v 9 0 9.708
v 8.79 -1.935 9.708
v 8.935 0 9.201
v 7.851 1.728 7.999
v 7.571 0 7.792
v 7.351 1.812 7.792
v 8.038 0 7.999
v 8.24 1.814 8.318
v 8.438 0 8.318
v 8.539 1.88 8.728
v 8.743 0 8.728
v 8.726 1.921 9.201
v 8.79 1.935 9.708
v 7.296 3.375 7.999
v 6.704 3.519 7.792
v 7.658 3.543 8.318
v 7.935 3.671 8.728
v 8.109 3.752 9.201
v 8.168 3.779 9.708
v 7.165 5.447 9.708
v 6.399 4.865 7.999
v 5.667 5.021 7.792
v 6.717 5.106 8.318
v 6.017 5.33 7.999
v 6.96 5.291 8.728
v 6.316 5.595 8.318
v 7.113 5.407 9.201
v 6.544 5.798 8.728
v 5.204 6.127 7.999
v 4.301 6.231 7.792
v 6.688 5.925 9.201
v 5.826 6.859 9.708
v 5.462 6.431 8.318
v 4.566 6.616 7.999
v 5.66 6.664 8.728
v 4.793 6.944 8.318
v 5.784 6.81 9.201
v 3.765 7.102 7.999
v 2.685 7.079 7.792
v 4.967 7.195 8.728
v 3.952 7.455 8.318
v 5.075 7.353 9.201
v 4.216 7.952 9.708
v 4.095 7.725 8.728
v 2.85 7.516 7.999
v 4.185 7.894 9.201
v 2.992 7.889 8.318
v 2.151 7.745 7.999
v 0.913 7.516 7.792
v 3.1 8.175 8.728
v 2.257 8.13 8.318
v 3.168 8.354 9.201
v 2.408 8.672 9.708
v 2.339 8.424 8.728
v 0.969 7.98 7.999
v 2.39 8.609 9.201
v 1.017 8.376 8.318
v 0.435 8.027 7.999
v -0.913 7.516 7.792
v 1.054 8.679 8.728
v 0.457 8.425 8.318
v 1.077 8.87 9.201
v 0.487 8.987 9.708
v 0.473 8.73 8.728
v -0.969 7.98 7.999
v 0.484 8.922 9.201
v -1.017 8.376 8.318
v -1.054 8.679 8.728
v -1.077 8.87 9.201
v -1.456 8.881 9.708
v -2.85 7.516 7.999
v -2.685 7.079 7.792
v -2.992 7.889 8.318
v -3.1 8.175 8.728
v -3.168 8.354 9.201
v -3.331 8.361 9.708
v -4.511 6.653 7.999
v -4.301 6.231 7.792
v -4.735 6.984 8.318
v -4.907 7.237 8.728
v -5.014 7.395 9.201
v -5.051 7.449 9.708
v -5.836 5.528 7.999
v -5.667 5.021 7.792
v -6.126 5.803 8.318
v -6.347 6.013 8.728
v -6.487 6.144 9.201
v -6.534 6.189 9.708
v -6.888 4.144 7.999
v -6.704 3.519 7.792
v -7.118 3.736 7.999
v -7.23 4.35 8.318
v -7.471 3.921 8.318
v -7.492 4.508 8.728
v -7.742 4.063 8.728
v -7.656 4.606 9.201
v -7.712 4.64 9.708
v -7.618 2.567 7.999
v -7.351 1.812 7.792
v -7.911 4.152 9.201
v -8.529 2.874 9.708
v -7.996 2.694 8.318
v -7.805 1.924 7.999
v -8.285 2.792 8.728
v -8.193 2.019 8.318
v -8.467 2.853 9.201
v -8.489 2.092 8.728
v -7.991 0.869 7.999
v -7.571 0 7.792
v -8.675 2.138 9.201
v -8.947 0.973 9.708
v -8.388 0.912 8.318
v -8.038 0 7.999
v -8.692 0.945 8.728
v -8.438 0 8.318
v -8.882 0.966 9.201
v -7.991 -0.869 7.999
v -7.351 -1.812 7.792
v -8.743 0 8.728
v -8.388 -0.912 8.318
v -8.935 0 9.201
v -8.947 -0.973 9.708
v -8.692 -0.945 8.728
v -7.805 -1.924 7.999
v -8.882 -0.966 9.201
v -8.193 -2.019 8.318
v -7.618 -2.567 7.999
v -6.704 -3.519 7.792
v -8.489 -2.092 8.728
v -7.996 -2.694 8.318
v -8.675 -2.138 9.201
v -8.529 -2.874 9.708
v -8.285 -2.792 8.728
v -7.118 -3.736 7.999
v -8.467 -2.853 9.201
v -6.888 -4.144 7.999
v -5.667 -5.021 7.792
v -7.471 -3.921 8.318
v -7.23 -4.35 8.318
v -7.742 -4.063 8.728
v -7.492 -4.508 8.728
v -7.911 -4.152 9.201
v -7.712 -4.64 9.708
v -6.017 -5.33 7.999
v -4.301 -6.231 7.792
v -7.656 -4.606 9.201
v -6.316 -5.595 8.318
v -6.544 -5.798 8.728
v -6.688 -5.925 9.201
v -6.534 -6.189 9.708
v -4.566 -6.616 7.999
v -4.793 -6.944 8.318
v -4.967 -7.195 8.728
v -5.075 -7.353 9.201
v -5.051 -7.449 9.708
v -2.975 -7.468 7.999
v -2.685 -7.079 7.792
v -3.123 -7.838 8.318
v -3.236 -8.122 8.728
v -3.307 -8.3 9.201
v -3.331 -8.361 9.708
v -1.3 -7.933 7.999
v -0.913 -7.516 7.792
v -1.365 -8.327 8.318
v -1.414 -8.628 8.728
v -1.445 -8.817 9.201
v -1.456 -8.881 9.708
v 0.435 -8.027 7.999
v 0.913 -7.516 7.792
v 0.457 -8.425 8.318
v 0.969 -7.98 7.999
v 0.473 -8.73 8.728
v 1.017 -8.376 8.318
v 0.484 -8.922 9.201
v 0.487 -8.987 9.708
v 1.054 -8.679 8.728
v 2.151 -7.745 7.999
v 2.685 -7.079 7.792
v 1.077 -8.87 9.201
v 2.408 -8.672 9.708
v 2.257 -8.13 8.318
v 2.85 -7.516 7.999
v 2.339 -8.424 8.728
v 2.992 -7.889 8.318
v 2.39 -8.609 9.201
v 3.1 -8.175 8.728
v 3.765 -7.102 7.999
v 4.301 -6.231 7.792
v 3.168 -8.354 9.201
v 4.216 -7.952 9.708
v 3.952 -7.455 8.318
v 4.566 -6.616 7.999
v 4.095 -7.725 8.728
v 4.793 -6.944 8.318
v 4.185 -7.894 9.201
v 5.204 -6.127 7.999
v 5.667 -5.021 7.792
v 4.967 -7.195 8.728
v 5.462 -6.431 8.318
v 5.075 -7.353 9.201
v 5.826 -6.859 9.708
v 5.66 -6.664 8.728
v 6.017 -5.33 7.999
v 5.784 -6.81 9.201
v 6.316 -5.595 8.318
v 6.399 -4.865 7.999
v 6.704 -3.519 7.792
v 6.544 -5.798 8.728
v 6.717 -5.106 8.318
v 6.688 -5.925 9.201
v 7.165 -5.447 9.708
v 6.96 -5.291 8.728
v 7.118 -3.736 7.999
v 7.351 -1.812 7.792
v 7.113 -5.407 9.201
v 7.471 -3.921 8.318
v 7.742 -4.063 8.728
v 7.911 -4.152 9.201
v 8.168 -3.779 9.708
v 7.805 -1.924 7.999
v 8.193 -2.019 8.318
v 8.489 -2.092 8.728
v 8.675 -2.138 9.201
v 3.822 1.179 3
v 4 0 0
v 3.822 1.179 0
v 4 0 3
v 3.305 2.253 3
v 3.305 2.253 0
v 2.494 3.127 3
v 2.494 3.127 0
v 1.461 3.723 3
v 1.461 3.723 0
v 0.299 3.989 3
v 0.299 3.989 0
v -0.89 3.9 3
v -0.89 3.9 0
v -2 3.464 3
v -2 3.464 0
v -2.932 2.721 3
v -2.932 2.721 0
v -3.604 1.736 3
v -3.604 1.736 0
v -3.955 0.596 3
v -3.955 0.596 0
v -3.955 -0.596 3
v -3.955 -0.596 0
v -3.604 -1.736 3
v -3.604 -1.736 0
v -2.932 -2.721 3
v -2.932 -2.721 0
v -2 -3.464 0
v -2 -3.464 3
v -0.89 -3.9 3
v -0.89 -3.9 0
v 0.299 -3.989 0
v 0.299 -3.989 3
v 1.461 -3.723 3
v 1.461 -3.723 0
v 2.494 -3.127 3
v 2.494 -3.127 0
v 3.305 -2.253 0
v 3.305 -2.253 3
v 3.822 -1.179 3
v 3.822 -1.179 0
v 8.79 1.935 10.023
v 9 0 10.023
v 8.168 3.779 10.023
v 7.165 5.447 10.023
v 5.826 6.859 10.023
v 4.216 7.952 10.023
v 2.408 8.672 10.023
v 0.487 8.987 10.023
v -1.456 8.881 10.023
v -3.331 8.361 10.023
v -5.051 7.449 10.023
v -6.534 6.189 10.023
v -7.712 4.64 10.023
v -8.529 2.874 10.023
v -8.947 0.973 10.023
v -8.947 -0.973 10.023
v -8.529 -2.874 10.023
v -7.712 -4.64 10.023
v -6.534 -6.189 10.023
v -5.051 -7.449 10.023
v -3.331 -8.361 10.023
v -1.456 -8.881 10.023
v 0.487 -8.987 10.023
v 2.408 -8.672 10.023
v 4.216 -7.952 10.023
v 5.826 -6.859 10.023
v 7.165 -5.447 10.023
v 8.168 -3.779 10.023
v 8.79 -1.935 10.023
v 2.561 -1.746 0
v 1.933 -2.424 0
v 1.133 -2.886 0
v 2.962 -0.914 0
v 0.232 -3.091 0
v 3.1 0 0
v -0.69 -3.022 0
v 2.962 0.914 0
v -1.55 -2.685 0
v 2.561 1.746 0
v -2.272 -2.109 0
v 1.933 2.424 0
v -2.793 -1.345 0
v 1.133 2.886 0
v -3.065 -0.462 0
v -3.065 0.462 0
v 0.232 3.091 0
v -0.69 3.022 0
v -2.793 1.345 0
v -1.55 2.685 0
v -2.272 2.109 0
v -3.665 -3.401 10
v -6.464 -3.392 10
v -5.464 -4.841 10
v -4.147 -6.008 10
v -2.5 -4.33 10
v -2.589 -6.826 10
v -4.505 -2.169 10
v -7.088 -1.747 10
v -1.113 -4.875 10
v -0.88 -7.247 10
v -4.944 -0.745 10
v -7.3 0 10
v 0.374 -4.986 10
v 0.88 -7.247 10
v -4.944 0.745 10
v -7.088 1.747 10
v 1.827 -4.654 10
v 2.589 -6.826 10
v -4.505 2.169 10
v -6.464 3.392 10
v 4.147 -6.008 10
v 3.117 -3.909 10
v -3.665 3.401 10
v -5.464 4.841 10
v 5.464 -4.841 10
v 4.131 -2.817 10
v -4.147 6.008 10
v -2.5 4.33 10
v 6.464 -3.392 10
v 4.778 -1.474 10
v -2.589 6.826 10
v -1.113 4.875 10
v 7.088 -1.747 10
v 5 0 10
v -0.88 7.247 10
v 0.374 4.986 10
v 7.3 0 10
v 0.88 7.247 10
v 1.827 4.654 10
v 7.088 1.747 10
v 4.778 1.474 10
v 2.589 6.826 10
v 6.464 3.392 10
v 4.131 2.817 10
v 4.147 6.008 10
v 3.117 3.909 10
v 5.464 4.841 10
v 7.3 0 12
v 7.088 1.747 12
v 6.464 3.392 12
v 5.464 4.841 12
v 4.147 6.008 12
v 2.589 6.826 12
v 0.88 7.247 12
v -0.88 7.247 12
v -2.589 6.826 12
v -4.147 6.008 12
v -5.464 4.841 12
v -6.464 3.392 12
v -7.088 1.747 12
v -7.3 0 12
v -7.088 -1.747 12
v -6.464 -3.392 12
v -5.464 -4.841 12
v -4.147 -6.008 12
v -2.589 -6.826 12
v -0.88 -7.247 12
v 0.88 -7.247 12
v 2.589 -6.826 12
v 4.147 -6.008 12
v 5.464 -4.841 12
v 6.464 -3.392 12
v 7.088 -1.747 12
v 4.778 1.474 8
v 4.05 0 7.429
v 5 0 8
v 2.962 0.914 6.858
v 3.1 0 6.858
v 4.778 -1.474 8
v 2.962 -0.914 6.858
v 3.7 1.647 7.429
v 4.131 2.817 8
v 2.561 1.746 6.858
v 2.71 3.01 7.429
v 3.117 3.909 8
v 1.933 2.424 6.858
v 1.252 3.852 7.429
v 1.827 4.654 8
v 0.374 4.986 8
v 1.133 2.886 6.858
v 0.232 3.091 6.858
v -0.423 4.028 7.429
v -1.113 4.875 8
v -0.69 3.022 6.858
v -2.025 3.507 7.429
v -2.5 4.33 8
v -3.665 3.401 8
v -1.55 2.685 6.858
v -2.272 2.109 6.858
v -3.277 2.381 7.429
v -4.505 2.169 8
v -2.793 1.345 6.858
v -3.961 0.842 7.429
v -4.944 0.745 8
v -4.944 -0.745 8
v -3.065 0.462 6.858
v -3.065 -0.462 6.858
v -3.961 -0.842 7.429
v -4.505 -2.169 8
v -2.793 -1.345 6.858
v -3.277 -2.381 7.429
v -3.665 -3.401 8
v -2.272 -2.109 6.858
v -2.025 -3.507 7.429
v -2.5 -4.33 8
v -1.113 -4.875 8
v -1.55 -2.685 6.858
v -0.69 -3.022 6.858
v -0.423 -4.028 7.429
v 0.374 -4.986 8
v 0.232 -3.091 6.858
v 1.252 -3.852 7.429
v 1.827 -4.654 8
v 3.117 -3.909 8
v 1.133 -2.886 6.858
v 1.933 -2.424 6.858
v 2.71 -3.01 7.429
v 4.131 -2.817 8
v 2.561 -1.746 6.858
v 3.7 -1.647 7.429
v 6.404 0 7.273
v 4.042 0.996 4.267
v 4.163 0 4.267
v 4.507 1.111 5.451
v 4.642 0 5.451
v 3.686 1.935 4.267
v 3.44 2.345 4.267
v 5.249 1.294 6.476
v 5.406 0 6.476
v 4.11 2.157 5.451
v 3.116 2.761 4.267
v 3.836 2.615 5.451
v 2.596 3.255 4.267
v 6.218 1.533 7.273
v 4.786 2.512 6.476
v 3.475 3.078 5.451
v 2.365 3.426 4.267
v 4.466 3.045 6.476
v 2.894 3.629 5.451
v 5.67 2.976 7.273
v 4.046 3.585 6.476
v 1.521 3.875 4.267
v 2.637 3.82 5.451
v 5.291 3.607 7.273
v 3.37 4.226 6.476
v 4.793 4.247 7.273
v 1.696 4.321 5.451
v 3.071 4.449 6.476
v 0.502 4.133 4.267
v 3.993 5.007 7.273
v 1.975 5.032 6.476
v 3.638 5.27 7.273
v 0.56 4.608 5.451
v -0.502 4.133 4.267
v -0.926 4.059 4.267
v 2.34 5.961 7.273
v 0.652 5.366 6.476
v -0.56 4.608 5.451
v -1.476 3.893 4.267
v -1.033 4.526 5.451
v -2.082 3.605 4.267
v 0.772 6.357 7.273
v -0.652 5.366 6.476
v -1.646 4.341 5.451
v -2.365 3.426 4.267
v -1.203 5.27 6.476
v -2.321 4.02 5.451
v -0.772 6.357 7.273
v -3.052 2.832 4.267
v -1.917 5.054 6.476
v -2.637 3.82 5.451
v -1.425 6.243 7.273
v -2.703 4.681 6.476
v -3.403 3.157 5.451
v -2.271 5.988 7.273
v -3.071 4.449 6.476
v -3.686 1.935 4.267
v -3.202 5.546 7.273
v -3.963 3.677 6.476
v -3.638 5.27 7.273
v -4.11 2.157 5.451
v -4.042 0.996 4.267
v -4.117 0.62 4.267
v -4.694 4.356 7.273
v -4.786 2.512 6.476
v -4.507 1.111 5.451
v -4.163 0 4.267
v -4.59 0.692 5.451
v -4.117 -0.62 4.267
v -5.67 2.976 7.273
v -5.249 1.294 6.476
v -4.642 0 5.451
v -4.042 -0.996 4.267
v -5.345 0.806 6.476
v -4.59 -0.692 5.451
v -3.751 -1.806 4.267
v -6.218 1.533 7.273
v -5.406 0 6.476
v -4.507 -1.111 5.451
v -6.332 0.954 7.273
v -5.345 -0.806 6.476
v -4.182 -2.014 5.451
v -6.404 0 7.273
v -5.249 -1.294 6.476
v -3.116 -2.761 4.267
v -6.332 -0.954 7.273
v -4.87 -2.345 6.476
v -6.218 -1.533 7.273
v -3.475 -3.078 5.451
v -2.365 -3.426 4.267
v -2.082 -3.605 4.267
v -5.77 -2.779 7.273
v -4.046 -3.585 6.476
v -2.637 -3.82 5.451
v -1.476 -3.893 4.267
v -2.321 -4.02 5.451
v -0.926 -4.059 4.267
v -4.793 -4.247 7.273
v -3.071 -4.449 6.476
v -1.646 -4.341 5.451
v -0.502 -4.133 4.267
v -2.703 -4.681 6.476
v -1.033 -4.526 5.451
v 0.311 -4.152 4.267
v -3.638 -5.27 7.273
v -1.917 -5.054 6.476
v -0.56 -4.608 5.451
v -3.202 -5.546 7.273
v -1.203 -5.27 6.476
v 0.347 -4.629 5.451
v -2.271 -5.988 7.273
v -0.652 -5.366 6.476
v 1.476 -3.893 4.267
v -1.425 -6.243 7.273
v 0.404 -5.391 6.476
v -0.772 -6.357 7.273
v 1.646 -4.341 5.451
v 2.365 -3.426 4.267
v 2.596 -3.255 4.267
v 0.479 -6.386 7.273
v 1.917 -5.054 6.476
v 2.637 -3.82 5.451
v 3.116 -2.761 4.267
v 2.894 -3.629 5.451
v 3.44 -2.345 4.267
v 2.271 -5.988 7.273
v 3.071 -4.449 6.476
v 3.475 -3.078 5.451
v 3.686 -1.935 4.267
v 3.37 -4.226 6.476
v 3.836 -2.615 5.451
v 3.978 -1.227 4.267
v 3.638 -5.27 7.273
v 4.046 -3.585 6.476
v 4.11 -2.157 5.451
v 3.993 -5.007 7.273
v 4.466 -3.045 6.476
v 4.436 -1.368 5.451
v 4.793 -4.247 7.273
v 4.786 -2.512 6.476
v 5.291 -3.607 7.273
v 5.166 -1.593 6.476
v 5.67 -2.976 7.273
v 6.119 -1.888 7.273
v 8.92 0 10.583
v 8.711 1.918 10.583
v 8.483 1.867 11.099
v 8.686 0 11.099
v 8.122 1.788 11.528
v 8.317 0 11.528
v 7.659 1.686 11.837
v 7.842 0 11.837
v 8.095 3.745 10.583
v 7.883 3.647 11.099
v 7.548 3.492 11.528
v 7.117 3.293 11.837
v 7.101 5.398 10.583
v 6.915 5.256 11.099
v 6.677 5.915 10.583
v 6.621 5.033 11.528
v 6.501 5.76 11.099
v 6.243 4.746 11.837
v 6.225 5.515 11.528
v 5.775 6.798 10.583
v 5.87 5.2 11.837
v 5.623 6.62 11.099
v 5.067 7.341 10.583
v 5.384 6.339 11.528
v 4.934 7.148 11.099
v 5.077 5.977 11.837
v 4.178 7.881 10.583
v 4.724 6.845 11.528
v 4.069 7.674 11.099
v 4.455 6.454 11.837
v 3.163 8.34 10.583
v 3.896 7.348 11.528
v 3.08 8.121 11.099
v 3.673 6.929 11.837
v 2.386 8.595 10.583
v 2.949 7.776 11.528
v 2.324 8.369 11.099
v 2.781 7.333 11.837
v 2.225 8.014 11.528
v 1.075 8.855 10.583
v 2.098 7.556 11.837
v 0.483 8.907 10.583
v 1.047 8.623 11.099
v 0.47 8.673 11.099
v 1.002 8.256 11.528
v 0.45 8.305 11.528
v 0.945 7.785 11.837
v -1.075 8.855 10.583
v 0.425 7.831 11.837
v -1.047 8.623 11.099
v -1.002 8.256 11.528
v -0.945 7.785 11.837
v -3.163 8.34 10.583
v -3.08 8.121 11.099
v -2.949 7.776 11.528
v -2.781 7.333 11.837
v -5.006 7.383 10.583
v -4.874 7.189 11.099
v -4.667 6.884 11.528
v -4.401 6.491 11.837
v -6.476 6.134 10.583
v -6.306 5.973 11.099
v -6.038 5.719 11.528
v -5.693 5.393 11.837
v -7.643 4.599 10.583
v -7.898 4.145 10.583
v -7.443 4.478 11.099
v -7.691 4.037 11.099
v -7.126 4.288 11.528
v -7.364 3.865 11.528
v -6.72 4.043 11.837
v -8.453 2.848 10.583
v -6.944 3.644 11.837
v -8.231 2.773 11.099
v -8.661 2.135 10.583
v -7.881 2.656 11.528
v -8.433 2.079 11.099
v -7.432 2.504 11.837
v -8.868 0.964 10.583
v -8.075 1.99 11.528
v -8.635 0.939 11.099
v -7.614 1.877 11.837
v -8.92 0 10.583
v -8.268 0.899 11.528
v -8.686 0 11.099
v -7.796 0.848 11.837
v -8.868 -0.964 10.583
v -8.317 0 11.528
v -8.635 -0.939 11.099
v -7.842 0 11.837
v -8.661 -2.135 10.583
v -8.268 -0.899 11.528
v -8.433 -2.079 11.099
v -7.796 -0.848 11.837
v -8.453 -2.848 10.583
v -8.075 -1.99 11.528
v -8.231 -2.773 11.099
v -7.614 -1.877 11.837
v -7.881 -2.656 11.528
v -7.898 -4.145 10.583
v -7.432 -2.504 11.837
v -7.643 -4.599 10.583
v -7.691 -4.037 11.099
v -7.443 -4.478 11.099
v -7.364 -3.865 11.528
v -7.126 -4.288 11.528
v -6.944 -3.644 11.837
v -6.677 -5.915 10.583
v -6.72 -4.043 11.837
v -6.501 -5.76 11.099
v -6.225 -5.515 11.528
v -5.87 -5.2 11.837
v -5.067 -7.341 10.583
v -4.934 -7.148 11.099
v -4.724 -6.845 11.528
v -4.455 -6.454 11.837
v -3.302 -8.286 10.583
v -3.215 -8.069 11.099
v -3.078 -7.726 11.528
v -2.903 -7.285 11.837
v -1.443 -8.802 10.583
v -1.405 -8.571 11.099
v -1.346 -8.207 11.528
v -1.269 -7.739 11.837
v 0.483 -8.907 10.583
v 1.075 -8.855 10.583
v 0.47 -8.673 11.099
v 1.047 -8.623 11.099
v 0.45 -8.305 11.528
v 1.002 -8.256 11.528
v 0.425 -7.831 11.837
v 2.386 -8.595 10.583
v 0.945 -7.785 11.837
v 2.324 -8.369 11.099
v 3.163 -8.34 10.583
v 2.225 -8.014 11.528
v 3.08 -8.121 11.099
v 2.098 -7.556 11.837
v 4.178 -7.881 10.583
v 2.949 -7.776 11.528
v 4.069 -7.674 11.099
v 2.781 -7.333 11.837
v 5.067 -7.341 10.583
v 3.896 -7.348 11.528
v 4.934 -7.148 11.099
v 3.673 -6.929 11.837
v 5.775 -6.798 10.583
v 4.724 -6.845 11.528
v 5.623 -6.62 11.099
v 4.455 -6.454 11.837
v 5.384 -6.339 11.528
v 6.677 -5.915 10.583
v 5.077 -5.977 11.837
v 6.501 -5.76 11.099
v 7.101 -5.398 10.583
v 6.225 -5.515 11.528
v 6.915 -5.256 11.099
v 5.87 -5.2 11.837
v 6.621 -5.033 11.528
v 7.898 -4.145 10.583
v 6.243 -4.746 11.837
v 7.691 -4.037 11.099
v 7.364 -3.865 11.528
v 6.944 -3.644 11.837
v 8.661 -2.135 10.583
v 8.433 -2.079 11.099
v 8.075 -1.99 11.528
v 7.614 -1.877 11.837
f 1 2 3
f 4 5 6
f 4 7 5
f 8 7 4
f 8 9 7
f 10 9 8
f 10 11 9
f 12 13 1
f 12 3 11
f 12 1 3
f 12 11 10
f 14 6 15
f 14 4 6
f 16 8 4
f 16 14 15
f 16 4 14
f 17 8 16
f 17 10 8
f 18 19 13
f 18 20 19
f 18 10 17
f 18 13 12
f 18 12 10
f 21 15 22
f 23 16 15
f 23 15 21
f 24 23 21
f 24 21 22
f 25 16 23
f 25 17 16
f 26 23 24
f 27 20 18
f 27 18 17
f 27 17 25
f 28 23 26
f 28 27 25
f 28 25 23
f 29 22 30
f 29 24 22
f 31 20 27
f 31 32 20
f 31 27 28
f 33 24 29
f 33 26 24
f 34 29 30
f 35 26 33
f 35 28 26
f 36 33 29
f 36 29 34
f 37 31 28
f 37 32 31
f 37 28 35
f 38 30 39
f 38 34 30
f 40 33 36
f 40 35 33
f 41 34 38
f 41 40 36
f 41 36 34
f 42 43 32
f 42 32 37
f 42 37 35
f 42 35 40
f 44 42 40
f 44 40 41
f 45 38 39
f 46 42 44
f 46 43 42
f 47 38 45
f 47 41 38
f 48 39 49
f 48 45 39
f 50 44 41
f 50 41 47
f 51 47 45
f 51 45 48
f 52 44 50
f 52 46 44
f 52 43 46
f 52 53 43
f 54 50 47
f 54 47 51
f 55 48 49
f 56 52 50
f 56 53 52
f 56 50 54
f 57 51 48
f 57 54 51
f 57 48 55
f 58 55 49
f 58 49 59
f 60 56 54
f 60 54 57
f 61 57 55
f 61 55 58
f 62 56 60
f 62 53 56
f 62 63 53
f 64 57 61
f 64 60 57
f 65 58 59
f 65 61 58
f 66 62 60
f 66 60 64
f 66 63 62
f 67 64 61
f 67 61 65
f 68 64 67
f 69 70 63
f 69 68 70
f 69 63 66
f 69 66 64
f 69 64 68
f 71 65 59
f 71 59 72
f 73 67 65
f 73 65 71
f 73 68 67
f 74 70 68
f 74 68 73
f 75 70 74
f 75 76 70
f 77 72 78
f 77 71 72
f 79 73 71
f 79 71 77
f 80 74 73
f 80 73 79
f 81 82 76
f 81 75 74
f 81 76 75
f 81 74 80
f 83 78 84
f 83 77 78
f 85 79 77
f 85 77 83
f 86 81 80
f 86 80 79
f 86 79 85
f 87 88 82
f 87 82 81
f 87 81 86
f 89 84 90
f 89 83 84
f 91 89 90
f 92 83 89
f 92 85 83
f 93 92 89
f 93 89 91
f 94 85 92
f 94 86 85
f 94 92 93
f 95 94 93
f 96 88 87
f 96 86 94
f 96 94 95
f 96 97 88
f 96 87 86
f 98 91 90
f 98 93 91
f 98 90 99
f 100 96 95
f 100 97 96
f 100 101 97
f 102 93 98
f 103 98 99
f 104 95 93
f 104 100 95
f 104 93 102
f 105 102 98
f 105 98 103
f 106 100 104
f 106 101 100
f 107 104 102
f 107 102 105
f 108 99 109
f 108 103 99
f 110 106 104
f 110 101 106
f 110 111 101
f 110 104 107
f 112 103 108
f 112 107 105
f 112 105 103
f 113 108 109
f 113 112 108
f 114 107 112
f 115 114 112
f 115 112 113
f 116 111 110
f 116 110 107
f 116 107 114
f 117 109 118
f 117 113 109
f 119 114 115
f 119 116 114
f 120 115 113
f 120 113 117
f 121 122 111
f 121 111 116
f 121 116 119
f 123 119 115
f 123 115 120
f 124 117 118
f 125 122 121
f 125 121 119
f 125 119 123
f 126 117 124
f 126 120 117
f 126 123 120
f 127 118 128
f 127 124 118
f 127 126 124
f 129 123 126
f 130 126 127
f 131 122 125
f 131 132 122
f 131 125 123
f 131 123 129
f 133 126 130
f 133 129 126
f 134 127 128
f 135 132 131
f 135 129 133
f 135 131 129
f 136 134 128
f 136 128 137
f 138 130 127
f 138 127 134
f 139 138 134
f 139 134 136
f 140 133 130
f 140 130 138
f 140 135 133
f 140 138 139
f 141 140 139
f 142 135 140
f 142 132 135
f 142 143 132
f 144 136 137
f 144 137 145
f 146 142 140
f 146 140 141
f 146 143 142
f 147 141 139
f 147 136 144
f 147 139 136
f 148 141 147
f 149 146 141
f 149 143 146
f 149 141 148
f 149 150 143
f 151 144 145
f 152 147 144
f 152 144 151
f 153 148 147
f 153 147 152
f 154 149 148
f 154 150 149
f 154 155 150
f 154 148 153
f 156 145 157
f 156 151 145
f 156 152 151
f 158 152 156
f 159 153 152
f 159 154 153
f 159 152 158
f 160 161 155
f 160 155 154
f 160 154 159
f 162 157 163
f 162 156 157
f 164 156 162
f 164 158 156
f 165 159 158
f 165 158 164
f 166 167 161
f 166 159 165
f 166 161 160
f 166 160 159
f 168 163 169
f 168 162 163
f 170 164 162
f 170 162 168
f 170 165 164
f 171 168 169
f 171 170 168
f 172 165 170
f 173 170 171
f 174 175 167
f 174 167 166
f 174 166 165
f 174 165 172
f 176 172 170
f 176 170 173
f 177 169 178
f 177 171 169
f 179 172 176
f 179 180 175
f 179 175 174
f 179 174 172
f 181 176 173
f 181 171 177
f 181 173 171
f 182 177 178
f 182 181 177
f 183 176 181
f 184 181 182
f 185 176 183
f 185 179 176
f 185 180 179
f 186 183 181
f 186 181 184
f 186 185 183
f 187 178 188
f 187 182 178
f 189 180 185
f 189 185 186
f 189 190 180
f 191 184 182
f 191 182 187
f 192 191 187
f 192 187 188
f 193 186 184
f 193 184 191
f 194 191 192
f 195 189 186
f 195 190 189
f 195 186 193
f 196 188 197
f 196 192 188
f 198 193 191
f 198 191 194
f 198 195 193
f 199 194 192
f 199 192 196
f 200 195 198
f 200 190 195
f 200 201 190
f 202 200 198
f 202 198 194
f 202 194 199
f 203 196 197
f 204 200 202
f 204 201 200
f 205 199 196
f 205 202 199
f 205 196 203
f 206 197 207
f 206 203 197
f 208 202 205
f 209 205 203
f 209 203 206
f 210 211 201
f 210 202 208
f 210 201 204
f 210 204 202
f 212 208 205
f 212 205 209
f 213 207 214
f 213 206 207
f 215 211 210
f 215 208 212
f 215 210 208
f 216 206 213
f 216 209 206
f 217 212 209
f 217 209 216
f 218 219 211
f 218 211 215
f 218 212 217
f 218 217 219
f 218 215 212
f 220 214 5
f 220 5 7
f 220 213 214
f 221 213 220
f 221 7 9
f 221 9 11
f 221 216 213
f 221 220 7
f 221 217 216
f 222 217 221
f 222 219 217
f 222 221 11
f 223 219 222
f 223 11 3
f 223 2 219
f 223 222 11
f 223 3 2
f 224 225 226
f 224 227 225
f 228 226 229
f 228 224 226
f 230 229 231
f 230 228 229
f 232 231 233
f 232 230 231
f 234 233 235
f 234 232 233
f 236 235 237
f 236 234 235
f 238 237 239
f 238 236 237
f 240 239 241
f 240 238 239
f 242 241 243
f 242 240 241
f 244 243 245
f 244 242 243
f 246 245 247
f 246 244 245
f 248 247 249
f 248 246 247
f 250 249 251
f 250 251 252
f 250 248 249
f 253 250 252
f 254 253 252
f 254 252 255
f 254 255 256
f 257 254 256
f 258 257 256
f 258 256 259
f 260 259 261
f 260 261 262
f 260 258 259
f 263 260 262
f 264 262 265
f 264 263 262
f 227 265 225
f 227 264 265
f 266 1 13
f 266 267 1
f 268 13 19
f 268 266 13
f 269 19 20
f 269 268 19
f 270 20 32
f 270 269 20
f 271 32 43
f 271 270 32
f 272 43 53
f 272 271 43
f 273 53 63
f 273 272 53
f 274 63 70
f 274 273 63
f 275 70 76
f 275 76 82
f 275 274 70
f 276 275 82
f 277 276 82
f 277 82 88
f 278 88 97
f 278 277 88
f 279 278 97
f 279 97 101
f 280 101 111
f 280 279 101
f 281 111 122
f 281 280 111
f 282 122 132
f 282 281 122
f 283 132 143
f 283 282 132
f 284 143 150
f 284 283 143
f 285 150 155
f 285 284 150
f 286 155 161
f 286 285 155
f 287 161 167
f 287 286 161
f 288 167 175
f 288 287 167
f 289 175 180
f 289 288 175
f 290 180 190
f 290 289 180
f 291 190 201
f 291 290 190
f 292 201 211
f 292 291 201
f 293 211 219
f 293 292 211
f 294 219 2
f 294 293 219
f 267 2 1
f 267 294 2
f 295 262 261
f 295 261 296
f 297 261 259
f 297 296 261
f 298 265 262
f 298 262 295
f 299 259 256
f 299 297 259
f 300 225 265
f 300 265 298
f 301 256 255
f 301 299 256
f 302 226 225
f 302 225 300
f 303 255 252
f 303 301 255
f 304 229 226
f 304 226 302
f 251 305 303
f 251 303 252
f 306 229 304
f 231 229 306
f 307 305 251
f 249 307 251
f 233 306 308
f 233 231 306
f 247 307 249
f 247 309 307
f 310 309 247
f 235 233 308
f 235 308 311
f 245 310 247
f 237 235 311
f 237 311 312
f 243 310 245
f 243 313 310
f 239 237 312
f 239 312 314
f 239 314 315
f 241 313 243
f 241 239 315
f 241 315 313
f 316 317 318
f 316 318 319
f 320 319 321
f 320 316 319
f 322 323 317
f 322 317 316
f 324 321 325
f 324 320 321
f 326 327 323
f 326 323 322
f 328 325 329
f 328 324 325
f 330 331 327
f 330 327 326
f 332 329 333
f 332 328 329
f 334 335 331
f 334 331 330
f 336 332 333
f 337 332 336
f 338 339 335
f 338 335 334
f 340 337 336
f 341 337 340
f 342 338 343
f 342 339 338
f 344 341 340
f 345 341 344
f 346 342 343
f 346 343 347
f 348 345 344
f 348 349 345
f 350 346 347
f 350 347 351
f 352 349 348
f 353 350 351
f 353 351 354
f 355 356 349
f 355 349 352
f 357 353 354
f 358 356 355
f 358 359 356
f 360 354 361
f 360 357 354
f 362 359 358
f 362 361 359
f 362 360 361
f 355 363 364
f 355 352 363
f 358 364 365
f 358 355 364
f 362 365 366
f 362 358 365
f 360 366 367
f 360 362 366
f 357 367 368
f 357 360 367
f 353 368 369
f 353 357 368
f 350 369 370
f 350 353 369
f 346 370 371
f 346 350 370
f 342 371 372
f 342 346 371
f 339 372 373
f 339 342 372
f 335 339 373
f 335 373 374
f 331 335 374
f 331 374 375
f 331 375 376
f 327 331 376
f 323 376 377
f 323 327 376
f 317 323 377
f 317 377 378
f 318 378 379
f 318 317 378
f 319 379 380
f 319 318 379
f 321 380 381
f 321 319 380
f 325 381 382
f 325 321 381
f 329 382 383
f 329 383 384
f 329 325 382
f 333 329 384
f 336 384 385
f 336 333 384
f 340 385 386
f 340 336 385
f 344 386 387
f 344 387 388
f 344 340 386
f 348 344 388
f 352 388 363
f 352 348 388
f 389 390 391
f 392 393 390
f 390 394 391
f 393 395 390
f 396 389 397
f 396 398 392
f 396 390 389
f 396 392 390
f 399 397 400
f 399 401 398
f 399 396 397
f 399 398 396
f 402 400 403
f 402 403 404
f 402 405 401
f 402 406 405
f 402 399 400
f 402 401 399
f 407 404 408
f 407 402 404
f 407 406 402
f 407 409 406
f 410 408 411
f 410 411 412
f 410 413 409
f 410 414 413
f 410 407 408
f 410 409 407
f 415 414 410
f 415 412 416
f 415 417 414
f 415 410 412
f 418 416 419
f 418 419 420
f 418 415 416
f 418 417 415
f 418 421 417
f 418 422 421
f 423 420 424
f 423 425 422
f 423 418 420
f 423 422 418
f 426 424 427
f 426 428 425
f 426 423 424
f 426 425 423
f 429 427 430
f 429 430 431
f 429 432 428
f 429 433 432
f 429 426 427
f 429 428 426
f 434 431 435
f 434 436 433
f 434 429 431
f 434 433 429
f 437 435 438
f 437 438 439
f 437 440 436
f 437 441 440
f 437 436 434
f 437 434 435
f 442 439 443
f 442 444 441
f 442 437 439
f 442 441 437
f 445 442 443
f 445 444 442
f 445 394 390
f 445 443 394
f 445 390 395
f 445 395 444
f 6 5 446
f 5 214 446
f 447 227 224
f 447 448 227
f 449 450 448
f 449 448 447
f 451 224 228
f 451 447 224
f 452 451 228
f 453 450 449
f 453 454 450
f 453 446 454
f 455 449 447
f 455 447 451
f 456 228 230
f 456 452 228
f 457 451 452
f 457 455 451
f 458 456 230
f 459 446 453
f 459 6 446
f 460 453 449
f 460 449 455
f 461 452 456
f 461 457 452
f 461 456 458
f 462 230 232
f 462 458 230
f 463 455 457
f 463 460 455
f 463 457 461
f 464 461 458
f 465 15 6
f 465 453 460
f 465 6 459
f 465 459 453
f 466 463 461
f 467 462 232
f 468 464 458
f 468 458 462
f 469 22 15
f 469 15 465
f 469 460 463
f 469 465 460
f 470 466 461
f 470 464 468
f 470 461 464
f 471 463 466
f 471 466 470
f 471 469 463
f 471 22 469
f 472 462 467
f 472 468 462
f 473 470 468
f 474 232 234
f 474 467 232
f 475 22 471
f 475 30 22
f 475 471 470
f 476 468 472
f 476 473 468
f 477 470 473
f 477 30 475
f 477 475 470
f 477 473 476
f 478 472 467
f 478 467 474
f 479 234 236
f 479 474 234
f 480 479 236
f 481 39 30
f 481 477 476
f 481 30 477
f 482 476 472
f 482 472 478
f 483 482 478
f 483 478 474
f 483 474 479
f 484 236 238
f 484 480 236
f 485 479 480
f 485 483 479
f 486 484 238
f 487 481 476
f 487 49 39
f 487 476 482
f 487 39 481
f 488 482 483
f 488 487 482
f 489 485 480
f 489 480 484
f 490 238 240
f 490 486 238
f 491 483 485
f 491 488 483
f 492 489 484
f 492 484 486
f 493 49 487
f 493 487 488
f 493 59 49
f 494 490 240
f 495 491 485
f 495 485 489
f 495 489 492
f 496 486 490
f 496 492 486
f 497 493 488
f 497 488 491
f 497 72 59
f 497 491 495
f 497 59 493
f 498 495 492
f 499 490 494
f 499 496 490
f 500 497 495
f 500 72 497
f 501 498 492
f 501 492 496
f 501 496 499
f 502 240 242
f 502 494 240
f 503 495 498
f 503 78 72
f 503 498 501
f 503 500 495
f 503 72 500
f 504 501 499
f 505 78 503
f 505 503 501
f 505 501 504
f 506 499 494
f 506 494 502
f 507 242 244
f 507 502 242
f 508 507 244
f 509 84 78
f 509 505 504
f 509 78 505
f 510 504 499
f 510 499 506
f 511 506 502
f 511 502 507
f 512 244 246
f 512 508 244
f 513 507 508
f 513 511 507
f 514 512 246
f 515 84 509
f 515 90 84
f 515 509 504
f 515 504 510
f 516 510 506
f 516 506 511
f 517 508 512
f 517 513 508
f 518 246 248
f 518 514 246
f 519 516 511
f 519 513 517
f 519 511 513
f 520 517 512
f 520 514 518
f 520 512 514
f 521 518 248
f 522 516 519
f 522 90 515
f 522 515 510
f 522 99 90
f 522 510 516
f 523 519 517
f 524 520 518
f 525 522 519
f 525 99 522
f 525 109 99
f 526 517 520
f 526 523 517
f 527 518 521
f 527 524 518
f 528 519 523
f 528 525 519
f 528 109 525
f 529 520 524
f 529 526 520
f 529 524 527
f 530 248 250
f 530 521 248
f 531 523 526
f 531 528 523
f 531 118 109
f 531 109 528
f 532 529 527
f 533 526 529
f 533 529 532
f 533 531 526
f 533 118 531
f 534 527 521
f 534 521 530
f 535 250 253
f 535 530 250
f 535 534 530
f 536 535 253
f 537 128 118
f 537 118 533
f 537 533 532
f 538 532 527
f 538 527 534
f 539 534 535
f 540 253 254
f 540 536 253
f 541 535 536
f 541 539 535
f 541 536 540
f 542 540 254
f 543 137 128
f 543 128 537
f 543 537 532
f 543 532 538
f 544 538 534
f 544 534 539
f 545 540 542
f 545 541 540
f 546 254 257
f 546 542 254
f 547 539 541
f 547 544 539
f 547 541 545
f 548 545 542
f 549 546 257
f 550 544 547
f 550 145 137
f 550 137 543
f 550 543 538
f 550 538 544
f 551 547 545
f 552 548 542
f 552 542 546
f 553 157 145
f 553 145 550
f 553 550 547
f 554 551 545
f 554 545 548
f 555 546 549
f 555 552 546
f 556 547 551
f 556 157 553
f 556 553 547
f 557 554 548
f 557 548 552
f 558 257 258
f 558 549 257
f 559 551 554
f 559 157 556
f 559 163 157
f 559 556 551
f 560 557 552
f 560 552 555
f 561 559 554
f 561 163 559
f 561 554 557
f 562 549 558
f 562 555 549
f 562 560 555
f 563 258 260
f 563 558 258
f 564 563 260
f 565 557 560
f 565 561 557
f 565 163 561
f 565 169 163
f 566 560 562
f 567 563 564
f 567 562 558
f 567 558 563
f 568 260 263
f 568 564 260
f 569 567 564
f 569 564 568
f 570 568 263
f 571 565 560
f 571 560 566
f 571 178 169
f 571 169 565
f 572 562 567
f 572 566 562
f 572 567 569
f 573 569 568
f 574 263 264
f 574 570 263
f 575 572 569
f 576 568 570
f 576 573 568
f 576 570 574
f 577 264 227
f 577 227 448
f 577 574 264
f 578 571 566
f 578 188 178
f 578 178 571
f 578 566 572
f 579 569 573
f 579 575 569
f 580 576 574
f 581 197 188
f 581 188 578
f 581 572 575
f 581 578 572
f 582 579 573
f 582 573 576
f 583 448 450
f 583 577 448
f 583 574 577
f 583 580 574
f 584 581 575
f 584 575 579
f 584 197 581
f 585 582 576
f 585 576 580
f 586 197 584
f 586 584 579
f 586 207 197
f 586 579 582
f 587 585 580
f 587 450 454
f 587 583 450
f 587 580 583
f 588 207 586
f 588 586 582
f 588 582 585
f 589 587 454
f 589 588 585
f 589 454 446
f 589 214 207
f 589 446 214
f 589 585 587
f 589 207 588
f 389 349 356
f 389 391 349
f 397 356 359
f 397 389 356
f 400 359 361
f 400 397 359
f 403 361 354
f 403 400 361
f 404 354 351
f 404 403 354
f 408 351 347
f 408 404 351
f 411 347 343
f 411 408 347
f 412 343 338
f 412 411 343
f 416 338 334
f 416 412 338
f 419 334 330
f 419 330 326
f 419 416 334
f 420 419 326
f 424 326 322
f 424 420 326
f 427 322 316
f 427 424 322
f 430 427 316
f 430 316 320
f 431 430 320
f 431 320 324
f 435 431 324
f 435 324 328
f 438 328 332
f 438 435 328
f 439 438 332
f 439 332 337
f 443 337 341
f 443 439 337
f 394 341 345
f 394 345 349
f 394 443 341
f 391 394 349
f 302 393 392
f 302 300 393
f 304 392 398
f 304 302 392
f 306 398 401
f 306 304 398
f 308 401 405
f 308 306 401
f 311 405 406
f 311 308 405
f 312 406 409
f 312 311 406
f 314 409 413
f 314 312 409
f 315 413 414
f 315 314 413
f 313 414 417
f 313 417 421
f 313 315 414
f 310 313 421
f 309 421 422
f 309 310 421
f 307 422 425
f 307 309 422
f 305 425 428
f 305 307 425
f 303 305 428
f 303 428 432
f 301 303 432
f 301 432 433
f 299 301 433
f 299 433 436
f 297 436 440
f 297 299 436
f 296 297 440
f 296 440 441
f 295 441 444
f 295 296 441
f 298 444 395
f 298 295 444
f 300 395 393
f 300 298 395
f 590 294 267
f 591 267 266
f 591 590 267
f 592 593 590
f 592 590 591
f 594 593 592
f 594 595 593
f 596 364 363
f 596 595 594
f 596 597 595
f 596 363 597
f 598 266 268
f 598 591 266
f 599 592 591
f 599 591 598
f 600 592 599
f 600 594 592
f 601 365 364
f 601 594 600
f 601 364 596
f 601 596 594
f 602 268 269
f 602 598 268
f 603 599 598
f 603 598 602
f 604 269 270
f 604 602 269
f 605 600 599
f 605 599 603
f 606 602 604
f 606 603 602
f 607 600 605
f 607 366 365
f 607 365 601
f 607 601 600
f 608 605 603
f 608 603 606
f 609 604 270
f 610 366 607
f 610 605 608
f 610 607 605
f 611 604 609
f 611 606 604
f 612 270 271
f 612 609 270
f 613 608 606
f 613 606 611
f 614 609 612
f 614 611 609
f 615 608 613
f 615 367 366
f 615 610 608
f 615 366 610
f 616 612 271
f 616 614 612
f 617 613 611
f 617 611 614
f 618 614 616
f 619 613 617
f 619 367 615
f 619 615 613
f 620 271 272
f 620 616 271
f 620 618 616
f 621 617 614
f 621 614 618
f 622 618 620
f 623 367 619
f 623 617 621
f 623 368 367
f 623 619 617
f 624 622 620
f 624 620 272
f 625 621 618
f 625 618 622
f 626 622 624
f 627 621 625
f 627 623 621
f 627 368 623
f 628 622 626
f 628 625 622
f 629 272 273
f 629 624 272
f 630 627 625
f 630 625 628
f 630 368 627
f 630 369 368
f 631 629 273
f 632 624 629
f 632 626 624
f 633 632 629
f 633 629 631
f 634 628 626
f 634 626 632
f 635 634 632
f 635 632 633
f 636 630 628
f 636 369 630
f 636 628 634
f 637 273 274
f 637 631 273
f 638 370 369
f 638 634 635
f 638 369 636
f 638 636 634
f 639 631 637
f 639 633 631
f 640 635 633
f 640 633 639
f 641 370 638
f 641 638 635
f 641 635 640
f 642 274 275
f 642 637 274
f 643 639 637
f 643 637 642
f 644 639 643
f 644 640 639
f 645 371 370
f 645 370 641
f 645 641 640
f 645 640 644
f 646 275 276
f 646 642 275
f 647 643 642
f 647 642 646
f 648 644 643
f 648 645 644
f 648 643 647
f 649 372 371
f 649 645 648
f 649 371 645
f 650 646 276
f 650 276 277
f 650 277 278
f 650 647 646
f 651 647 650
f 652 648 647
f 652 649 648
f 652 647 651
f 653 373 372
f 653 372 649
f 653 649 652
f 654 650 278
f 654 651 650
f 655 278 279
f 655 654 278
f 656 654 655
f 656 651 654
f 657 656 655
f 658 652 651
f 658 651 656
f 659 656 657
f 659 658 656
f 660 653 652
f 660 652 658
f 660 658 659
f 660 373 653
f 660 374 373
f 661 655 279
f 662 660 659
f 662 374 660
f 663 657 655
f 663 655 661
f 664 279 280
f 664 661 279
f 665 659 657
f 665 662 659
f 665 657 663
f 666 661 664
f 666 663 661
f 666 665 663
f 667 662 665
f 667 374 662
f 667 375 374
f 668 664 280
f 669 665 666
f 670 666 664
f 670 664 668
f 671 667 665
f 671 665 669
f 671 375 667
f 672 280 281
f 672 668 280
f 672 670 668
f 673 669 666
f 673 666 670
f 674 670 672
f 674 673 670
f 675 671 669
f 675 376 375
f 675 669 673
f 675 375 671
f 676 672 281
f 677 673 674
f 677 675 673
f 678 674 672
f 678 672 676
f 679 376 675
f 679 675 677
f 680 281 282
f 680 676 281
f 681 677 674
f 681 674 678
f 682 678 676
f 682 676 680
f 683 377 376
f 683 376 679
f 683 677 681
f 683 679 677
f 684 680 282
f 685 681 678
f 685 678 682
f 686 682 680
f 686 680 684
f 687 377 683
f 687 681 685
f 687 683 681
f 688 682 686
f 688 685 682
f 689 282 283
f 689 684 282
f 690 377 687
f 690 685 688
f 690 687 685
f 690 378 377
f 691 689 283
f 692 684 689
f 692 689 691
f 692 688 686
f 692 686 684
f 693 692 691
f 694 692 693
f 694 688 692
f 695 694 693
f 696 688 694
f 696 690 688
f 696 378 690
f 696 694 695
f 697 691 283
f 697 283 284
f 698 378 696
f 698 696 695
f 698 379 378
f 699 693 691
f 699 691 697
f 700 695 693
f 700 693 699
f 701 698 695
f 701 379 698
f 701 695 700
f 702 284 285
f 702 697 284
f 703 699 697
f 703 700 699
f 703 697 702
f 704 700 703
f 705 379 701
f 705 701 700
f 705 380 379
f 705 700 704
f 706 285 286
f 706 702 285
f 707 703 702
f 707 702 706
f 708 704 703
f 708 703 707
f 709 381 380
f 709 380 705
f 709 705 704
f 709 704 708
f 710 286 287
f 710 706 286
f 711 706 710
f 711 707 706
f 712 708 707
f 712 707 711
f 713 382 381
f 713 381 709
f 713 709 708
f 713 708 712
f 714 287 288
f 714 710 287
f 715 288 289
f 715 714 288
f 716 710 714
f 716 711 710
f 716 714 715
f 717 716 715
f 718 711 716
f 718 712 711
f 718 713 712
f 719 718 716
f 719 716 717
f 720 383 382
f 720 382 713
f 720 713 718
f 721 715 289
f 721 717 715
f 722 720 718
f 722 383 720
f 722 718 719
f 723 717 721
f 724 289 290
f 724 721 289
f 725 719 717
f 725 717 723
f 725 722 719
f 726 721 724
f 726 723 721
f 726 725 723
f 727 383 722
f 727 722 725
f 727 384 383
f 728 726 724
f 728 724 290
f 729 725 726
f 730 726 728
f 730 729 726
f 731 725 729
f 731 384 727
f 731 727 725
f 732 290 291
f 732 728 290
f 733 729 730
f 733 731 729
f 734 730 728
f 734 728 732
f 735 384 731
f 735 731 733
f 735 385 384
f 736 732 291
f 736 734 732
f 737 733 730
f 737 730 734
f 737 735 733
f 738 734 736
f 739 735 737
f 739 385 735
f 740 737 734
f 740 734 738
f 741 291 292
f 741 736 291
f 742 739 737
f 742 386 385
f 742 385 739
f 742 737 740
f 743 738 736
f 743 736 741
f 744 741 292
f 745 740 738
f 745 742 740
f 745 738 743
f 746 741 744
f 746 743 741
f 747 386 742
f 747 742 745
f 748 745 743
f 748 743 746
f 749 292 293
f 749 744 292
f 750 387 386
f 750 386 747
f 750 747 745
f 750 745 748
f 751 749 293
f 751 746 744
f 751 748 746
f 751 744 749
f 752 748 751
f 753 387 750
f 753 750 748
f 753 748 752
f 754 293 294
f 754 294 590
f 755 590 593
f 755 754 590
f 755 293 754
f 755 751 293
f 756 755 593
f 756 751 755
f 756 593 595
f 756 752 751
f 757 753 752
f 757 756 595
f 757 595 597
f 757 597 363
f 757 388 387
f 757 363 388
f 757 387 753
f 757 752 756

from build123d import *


with BuildPart() as f1:
    # F0 (on Front) → F1 (revolve)
    with BuildSketch(Plane.XZ):
        with BuildLine():
            Line((9, 9.708204), (9, 10.022628))
            ThreePointArc((9, 10.022628), (8.516575, 11.326468), (7.3, 12))
            Line((7.3, 12), (7.3, 10))
            Line((7.3, 10), (5, 10))
            Line((5, 10), (5, 8))
            Line((5, 8), (3.1, 6.858365))
            Line((3.1, 6.858365), (3.1, 0))
            Line((3.1, 0), (4, 0))
            Line((4, 0), (4, 3))
            ThreePointArc((4, 3), (4.991081, 5.988072), (7.571429, 7.791574))
            ThreePointArc((7.571429, 7.791574), (8.603567, 8.512975), (9, 9.708204))
        make_face()
    revolve(axis=Axis((0, 0, 6), (0, 0, 1)))


solid = f1.part
